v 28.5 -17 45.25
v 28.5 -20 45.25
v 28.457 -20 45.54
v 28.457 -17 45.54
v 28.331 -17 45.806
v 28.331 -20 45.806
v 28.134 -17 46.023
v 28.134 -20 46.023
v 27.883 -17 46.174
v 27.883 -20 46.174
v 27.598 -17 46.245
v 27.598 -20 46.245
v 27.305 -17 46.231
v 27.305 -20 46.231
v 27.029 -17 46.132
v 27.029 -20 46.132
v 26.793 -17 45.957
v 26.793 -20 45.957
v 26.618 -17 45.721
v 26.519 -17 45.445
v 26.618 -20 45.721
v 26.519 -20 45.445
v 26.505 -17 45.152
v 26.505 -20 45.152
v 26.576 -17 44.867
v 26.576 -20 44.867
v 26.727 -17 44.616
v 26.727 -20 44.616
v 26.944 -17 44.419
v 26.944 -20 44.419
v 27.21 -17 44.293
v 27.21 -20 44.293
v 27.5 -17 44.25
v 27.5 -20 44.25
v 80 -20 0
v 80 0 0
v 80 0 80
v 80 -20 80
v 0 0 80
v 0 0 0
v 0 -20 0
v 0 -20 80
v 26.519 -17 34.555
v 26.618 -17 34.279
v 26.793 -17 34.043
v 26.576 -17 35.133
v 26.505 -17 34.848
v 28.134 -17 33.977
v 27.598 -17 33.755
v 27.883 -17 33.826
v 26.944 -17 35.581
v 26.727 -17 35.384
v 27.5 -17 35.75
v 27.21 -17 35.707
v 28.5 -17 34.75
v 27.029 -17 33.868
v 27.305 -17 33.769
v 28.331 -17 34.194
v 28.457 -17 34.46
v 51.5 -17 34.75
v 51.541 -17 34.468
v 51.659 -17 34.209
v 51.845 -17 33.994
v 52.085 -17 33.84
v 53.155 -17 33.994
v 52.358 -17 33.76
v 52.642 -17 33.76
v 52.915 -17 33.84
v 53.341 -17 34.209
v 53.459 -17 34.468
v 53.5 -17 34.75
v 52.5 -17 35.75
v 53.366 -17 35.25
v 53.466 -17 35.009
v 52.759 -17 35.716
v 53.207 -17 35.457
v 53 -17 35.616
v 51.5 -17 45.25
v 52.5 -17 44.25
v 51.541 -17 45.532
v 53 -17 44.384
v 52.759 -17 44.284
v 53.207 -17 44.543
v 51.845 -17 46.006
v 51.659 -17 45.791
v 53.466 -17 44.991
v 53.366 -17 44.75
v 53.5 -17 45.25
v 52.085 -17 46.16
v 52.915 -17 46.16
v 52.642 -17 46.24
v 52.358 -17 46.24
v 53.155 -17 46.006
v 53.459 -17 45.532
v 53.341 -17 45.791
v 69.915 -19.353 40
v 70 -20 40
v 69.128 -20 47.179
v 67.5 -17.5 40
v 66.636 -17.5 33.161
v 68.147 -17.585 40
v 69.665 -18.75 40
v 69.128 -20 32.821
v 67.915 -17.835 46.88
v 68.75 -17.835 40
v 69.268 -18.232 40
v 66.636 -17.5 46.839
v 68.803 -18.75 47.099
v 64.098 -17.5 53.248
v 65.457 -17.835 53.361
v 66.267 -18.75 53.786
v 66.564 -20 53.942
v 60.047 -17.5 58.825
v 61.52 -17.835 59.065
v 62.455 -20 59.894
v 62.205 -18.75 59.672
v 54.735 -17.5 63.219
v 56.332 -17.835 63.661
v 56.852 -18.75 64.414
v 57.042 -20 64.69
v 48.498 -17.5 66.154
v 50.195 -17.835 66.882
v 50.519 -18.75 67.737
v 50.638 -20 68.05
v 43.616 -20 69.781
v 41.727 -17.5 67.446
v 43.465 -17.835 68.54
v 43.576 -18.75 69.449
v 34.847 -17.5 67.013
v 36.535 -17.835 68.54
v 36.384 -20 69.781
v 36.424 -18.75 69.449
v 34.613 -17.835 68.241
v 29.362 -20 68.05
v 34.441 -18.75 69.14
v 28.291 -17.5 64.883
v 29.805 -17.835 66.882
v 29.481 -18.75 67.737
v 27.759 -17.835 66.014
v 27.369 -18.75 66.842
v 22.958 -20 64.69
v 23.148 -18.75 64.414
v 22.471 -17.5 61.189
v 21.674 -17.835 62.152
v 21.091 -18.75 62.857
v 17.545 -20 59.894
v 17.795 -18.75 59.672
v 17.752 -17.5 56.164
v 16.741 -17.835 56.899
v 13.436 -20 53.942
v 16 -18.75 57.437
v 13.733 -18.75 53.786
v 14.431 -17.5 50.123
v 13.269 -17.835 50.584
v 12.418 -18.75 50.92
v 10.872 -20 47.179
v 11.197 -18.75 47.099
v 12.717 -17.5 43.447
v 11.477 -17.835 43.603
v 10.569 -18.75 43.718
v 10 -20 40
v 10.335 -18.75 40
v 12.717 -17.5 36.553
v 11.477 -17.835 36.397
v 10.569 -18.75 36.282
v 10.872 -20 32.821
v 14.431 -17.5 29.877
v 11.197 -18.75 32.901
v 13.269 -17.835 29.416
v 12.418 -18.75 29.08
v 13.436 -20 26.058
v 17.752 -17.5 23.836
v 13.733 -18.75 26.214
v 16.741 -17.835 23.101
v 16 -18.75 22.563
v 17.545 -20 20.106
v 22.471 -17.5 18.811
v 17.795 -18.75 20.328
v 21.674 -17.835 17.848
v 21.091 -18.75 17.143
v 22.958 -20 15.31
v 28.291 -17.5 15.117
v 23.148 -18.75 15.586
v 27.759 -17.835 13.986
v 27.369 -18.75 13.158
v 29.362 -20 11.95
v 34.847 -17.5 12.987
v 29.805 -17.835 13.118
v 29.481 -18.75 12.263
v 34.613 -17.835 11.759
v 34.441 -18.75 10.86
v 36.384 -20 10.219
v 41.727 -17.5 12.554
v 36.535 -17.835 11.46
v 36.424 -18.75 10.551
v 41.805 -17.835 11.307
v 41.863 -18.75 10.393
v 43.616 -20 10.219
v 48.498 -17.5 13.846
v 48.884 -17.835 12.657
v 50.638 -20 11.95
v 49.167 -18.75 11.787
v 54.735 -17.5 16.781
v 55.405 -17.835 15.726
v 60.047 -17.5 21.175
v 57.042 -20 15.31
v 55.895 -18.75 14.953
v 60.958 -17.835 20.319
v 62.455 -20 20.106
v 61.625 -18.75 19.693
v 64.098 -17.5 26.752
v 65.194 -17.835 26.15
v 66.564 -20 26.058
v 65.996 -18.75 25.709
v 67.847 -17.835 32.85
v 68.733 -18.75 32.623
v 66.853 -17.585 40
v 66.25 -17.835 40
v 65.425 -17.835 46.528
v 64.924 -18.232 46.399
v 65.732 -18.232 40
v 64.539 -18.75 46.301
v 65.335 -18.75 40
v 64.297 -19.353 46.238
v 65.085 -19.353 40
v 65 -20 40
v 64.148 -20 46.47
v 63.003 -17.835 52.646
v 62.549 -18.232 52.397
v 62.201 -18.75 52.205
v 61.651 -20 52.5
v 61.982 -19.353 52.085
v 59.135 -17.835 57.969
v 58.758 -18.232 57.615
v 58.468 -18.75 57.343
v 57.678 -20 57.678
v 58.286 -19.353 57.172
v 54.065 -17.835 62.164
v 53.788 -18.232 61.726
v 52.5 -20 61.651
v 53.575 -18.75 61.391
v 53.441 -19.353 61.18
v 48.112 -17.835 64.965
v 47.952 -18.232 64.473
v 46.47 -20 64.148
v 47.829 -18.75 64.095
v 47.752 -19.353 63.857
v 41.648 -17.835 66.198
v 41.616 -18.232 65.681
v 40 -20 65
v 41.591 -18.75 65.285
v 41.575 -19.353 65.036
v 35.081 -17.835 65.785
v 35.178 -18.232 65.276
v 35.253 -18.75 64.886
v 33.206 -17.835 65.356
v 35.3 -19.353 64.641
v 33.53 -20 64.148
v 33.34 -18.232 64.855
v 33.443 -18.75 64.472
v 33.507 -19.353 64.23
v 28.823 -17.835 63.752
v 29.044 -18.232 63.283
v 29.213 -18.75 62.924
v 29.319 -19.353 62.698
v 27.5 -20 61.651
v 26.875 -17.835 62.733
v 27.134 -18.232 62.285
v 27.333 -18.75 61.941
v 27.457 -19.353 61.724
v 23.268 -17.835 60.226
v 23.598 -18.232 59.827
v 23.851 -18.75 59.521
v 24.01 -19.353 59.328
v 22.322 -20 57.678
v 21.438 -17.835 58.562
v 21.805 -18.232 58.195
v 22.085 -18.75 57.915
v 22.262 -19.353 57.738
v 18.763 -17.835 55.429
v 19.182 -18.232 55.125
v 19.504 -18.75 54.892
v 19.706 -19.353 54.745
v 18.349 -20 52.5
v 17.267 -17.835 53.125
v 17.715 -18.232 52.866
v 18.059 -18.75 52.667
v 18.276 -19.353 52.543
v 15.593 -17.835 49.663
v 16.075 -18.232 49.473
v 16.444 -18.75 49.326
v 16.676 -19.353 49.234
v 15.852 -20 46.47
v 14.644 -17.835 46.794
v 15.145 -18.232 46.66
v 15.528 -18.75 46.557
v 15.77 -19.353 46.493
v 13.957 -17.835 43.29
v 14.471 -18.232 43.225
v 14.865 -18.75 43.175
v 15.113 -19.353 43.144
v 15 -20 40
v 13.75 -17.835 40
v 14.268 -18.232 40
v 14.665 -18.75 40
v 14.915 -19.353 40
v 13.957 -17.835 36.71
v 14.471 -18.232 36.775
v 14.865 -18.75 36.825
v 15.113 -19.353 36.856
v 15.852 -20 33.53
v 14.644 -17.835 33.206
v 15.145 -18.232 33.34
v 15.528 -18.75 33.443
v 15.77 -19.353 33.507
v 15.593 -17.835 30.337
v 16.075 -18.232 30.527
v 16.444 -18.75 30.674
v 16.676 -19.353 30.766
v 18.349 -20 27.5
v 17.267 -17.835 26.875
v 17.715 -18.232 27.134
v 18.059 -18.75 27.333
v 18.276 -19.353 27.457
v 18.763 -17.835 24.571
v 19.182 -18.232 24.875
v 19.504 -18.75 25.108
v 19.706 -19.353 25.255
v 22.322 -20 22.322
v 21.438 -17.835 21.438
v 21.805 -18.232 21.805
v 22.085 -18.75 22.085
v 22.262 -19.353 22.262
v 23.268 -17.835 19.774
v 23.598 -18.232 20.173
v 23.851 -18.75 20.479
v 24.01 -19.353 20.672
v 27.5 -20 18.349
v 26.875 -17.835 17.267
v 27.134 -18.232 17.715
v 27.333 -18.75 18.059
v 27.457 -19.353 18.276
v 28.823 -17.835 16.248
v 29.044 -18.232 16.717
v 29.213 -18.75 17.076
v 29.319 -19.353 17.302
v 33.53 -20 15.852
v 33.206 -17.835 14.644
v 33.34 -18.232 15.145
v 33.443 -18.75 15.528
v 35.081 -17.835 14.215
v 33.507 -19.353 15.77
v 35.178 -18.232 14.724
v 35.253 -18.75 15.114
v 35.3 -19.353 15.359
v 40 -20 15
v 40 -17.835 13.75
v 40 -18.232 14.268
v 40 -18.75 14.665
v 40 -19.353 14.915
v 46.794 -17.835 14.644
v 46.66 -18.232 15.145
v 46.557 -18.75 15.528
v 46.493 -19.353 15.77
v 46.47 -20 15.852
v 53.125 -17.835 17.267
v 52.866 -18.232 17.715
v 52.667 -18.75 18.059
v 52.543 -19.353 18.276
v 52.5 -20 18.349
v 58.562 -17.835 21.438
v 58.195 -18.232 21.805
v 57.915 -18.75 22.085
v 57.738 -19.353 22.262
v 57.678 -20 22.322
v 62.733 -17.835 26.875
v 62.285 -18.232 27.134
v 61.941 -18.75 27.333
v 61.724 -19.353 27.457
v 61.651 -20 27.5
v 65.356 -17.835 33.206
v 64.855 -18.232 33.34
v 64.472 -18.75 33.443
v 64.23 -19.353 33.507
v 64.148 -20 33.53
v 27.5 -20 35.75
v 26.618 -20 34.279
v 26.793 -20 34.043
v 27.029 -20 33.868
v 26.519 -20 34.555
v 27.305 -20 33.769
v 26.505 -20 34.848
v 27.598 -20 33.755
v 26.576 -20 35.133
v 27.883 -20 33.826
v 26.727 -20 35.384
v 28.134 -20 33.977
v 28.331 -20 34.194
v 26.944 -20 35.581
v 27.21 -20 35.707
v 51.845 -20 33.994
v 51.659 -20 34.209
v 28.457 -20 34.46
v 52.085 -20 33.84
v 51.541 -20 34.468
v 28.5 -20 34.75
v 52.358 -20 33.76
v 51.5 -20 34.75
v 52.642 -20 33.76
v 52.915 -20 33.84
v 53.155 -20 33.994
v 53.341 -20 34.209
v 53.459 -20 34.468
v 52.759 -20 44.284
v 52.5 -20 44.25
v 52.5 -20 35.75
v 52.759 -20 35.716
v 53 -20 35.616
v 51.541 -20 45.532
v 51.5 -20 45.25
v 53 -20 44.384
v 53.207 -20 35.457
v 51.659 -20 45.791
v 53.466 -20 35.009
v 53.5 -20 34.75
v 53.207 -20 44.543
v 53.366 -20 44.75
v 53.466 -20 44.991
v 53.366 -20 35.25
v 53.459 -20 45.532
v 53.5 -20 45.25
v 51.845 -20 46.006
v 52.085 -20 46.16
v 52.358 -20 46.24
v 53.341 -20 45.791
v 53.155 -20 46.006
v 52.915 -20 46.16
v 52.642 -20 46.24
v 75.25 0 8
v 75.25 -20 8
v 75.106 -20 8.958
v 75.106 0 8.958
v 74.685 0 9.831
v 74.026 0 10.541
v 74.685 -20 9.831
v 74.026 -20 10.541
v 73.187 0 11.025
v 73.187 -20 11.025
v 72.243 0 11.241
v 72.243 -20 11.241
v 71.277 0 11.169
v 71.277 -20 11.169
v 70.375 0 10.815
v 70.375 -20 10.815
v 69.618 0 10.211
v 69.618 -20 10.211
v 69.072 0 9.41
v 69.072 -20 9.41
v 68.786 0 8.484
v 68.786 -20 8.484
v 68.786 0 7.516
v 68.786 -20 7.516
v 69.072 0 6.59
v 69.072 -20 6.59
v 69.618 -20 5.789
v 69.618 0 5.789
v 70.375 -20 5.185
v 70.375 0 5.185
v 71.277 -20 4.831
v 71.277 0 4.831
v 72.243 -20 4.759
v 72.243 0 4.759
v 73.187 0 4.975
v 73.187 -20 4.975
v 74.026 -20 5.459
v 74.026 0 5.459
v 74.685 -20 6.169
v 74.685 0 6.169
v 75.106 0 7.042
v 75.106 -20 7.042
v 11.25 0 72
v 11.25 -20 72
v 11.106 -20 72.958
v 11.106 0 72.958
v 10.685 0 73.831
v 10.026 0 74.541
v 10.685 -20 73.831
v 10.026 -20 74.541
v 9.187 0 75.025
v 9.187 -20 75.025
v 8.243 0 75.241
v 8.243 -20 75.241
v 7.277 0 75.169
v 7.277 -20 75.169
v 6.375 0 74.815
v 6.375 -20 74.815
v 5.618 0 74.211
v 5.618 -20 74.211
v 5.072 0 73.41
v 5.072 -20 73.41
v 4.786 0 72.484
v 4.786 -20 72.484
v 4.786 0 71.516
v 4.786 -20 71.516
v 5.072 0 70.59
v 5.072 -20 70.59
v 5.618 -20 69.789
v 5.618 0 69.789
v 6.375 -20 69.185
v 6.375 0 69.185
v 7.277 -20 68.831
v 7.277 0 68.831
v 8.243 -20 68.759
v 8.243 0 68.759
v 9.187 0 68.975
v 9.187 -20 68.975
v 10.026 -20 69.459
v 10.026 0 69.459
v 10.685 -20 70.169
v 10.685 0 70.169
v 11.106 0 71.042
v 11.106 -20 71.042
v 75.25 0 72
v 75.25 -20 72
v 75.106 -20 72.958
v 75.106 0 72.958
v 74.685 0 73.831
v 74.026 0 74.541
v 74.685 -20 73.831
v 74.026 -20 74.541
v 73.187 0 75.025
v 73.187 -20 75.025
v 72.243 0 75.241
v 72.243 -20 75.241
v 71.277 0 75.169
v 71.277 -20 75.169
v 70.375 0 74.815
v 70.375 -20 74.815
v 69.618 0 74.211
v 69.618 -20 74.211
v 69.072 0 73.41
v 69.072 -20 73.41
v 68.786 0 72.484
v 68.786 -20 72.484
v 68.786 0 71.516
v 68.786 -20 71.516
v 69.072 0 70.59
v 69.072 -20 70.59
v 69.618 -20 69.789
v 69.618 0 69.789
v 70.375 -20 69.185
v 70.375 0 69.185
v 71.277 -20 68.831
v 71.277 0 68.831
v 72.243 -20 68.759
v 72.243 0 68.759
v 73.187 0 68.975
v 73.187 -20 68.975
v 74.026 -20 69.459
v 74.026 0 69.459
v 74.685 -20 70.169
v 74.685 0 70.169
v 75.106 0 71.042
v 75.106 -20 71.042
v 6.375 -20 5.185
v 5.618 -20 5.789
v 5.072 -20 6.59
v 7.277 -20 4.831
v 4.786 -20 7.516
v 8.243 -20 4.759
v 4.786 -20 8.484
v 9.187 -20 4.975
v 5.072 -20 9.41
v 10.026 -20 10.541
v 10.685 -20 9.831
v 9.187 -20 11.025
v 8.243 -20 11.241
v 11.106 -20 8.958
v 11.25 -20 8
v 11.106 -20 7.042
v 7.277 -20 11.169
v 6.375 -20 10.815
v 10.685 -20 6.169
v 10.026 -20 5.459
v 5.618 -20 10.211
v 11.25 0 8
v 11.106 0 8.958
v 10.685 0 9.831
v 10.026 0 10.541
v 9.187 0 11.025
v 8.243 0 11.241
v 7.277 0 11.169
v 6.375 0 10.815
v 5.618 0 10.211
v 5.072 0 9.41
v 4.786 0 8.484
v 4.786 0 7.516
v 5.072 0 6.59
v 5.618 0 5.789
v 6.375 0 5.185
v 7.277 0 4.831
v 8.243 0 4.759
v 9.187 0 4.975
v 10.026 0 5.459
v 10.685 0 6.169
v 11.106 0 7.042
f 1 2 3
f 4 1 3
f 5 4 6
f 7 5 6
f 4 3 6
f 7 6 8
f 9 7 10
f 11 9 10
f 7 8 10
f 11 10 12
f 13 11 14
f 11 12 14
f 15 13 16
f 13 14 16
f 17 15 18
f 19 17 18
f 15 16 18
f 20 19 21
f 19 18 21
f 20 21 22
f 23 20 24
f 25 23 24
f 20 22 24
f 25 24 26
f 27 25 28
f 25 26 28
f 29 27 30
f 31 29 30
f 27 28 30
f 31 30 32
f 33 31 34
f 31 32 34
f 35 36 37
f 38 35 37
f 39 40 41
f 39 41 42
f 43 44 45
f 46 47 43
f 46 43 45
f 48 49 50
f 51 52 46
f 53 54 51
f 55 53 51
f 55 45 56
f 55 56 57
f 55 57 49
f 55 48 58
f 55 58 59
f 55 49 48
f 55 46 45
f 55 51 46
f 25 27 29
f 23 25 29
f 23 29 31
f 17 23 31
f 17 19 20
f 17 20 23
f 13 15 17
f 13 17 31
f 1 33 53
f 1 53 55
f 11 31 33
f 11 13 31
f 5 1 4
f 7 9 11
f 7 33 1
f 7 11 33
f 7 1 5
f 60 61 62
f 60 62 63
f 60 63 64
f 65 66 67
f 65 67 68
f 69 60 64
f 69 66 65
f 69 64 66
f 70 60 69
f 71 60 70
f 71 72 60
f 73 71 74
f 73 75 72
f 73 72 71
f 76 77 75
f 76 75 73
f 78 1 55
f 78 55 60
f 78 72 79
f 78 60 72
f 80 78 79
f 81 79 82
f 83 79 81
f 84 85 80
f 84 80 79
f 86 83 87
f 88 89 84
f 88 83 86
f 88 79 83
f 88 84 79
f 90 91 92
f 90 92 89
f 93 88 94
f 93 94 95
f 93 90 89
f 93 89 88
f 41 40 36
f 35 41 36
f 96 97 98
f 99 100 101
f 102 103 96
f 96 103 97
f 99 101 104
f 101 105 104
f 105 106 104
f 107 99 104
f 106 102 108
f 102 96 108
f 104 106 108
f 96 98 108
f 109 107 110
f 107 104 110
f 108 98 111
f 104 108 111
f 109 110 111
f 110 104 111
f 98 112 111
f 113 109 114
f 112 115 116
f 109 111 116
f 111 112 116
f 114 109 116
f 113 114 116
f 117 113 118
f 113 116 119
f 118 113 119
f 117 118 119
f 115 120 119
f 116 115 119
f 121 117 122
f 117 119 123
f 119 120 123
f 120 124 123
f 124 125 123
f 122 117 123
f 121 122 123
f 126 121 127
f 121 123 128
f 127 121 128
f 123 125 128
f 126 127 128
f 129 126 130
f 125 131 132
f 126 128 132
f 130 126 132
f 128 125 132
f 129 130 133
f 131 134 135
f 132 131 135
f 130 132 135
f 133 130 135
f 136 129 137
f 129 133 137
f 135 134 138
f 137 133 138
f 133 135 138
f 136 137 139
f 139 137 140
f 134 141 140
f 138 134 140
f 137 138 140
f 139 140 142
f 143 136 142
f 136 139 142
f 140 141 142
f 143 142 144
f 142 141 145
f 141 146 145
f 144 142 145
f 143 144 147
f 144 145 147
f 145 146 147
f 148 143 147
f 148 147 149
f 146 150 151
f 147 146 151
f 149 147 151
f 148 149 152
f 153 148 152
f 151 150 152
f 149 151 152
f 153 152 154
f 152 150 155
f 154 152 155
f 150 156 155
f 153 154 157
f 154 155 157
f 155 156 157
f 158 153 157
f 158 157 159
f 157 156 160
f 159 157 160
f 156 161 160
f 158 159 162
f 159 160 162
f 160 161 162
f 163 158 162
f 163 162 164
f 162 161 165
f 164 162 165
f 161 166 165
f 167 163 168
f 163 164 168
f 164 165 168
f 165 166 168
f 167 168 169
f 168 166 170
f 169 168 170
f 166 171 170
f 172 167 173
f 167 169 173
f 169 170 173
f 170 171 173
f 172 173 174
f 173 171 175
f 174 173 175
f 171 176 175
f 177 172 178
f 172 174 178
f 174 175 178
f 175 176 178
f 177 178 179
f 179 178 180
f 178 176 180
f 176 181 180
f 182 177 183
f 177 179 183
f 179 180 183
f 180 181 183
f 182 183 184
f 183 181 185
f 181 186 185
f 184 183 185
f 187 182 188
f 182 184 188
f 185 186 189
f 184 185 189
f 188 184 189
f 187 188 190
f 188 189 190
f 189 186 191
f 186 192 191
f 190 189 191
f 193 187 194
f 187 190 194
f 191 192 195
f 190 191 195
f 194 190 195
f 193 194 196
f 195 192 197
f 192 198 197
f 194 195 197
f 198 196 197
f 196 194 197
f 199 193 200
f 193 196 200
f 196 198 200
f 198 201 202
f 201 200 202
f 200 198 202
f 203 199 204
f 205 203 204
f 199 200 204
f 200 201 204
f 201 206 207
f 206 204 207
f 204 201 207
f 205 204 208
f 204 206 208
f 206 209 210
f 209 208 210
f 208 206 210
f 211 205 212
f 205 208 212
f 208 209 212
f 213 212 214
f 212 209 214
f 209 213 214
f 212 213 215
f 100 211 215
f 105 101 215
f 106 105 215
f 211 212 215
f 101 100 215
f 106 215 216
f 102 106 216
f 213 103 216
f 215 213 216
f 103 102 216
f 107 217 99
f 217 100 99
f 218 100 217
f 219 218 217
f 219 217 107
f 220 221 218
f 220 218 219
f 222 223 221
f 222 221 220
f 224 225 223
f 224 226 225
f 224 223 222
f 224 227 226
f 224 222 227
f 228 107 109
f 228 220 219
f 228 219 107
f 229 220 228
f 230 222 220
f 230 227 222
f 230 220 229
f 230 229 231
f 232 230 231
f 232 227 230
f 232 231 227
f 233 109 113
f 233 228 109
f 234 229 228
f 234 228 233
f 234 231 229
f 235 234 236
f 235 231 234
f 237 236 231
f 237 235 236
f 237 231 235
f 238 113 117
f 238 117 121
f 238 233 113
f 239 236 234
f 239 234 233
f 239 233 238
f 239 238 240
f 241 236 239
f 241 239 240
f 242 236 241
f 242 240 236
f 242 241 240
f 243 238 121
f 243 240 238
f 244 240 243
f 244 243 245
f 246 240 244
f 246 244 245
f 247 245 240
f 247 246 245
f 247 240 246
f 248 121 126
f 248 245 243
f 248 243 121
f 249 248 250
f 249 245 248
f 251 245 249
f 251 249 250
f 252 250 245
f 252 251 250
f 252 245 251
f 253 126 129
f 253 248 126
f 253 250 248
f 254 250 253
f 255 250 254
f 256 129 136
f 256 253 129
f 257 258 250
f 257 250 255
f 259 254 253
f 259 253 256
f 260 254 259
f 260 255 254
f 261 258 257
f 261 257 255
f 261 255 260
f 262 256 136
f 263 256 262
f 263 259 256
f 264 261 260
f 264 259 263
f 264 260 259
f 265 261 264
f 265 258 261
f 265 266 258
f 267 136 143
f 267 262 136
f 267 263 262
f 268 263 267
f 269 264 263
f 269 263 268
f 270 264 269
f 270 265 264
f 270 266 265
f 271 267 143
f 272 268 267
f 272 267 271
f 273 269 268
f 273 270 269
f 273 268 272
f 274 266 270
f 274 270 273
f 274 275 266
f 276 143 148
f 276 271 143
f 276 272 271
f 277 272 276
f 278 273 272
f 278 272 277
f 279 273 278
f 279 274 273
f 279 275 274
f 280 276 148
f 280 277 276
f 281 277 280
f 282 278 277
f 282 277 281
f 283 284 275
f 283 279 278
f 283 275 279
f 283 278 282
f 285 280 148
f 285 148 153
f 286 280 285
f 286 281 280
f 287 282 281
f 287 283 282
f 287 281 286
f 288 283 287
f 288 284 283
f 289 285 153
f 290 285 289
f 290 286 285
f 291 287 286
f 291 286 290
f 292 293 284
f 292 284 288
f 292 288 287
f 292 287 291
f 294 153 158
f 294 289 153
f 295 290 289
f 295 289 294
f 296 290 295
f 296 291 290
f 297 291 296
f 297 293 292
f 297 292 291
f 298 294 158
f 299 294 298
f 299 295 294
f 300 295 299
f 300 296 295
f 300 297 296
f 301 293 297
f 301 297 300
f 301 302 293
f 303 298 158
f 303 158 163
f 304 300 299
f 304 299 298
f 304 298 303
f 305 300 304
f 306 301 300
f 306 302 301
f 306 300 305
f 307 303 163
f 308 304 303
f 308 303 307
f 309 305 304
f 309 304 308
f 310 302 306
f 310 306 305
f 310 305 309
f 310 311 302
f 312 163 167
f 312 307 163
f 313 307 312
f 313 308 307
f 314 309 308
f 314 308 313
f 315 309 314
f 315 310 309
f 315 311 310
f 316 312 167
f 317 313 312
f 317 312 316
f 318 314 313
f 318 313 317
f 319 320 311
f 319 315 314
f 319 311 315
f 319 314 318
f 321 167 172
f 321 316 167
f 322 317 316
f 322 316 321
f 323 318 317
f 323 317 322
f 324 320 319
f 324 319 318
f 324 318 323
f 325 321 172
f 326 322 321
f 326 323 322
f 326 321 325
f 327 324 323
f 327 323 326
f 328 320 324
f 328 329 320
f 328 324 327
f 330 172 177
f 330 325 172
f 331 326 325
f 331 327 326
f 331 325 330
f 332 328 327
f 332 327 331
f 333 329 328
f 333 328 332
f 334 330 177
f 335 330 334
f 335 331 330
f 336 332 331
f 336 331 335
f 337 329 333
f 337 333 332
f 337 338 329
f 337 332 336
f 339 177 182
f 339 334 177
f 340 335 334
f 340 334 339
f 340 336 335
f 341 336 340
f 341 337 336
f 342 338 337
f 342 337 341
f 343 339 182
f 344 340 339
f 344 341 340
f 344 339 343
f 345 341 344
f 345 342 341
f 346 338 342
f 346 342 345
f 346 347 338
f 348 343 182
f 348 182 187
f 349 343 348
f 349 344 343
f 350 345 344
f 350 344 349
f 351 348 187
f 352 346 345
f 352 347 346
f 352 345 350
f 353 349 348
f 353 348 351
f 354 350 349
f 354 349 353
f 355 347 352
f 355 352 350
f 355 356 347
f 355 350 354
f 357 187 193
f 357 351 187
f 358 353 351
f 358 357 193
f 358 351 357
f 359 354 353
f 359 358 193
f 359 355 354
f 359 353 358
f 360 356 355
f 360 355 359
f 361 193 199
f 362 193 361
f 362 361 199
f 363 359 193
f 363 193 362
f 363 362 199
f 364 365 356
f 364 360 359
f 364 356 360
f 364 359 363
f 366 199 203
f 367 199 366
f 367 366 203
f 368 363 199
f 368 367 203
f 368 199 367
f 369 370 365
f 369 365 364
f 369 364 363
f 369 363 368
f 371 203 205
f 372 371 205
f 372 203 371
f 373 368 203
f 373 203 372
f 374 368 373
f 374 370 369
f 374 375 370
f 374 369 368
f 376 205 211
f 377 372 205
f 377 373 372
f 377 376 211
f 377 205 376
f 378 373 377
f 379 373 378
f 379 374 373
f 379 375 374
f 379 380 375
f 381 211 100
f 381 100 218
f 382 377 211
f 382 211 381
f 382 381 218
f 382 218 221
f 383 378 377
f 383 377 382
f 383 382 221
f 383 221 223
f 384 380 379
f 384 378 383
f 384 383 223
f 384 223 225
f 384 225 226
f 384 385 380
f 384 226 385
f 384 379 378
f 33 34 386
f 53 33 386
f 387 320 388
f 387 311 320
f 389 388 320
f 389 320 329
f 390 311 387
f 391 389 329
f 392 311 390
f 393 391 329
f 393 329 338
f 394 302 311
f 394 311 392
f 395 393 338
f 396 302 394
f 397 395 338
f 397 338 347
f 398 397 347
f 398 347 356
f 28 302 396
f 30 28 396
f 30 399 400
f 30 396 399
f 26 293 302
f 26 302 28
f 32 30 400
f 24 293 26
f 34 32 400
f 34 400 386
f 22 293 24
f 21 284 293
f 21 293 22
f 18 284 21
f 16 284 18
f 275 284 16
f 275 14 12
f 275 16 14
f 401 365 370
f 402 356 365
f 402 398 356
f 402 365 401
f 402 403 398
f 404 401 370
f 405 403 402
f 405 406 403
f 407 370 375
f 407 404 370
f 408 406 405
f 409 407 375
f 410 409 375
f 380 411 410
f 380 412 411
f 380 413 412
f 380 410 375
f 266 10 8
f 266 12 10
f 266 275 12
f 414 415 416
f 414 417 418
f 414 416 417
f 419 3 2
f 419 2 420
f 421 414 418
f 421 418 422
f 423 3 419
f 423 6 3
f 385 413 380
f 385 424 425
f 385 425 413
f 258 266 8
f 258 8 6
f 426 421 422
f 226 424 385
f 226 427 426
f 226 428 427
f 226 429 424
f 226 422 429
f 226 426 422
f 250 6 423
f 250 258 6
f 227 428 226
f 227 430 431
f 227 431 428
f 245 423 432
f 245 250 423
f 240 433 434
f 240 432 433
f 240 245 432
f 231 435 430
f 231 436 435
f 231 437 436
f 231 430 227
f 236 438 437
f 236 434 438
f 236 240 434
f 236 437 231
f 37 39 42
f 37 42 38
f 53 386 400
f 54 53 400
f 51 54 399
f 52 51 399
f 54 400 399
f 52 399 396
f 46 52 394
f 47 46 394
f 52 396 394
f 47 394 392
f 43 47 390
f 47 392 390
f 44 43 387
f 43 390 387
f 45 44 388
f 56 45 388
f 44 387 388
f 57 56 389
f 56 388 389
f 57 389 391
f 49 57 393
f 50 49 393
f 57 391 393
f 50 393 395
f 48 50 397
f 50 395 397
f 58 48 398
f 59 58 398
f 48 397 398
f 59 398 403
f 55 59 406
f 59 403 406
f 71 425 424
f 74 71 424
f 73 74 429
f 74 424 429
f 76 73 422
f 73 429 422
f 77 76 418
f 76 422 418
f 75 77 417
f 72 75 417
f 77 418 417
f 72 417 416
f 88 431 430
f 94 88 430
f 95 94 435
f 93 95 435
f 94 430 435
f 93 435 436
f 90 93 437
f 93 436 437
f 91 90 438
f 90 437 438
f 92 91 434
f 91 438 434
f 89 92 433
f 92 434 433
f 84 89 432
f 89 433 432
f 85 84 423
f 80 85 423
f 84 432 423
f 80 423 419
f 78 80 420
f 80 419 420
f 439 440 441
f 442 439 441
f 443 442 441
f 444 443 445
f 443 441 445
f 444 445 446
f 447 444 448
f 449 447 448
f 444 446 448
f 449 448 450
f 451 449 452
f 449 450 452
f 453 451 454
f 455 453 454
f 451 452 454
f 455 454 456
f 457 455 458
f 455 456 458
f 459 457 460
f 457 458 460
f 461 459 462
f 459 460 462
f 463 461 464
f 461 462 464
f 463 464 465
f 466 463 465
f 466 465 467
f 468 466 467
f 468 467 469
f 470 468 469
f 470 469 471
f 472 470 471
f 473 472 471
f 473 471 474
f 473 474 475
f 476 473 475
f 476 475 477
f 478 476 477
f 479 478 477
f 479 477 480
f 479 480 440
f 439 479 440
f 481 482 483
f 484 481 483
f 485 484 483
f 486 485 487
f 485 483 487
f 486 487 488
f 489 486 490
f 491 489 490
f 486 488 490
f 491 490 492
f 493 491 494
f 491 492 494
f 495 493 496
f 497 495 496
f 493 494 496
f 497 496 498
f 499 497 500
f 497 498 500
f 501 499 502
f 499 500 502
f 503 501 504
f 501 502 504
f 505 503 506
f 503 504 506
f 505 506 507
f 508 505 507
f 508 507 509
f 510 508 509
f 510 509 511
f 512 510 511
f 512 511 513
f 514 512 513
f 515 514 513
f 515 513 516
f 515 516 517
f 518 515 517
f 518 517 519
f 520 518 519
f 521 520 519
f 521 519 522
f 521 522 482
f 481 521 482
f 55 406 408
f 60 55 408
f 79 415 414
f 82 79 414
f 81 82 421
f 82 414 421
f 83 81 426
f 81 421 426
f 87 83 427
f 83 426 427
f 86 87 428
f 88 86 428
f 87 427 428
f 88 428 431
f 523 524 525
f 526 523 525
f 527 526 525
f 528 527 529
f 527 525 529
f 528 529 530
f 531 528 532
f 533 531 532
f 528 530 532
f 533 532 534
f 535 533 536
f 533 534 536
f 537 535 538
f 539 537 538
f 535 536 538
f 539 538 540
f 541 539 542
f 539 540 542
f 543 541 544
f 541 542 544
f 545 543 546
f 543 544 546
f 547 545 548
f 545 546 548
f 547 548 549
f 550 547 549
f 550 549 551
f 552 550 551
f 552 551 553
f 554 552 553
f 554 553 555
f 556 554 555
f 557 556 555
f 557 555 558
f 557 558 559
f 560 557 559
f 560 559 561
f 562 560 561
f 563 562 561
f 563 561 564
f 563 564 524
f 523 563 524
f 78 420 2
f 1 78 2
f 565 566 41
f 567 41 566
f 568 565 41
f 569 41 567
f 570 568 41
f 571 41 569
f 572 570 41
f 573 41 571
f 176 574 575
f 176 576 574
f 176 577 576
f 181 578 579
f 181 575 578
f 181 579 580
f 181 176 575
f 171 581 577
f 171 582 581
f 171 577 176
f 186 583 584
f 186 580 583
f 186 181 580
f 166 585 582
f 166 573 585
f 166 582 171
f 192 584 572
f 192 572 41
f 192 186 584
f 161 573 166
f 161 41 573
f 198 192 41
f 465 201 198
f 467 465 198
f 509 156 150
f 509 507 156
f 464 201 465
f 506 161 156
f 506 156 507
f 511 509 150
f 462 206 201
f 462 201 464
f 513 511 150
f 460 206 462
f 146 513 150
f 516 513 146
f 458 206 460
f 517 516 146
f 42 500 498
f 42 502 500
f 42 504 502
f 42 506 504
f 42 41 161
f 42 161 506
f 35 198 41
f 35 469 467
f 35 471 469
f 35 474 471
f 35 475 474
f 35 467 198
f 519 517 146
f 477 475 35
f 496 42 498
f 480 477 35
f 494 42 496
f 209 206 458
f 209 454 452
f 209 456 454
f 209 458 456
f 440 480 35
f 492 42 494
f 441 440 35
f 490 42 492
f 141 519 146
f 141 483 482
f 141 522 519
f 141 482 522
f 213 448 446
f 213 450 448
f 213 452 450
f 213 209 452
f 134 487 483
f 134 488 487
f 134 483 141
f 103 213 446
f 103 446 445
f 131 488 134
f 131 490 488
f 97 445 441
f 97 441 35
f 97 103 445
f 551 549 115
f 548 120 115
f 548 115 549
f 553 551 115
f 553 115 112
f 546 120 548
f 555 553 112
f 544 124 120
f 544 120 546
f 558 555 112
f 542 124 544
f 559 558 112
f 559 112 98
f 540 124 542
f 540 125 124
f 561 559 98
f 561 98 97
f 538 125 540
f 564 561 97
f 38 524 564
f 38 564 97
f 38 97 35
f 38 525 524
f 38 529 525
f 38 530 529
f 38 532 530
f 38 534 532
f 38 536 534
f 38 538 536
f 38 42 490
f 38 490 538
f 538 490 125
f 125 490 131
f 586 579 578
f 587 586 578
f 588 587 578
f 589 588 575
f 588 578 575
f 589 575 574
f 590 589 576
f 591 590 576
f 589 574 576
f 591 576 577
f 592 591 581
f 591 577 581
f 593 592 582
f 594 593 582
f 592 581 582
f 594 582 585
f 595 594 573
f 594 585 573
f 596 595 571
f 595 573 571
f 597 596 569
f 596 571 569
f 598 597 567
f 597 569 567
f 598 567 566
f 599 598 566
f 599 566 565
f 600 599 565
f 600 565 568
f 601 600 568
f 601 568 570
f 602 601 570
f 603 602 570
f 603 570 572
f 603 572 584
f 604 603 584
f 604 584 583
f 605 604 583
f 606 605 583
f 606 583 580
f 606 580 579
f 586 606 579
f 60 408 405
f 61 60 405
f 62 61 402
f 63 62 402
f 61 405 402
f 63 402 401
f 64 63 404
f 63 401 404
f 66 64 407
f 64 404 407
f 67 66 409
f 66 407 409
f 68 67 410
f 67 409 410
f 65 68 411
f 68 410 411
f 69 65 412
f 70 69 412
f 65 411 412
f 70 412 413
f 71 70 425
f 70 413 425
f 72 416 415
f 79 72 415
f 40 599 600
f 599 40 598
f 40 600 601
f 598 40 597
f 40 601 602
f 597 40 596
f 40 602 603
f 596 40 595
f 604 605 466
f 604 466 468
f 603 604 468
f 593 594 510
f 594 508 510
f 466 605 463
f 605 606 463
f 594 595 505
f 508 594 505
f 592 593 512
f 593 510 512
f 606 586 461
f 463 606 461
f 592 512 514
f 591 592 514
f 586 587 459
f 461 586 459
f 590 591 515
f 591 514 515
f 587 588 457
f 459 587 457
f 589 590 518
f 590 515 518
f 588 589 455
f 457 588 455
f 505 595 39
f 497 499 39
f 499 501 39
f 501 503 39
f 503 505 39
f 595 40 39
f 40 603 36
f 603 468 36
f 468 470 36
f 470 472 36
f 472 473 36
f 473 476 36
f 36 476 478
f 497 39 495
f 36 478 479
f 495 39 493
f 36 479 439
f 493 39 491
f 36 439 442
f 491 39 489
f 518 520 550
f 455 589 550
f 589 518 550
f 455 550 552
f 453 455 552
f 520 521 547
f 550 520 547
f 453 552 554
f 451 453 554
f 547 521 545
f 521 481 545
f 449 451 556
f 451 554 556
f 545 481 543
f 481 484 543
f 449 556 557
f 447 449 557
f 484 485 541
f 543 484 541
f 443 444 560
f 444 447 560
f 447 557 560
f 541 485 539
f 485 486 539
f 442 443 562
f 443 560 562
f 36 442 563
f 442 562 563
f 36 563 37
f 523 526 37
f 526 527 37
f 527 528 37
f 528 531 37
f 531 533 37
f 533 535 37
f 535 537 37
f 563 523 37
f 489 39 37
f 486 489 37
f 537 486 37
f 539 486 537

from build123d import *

# Parameters (mm, degrees)
F1_W     = 80
F1_H     = 80
F2_DEPTH = 20
F4_R     = 3.25
F5_DEPTH = 20.001
F4_R_2   = 30
F4_R_3   = 25
F6_DEPTH = 2.5
F7_DEPTH = 3
F8_R     = 2.49999
F9_R     = 2.49999


# Not quite as in the source:
# - a fillet or chamfer is up to 0.001 mm smaller than in the source, because OpenCascade refuses the exact size


with BuildPart() as f2:
    # F1 (on Front) → F2 (new body)
    with BuildSketch(Plane.XZ):
        with Locations((40, 40)):
            Rectangle(F1_W, F1_H)
    extrude(amount=F2_DEPTH)

    # F4 (on face) → F5 (cut, through all)
    with BuildSketch(Plane.XZ.offset(20)):
        with Locations((72, 8)):
            Circle(F4_R)
        with Locations((8, 8)):
            Circle(F4_R)
        with Locations((8, 72)):
            Circle(F4_R)
        with Locations((72, 72)):
            Circle(F4_R)
    extrude(amount=-F5_DEPTH, mode=Mode.SUBTRACT)

    # F4 (on face) → F6 (cut)
    with BuildSketch(Plane.XZ.offset(20)):
        with Locations((40, 40)):
            Circle(F4_R_2)
        with Locations((40, 40)):
            Circle(F4_R_3, mode=Mode.SUBTRACT)
    extrude(amount=-F6_DEPTH, mode=Mode.SUBTRACT)

    # F4 (on face) → F7 (cut)
    with BuildSketch(Plane.XZ.offset(20)):
        with BuildLine():
            Line((28.5, 45.25), (27.5, 45.25))
            Line((27.5, 45.25), (27.5, 44.25))
            ThreePointArc((27.5, 44.25), (28.2071067812, 44.5428932188), (28.5, 45.25))
        make_face()
        with BuildLine():
            Line((51.5, 45.25), (28.5, 45.25))
            ThreePointArc((28.5, 45.25), (28.2071067812, 44.5428932188), (27.5, 44.25))
            Line((27.5, 44.25), (27.5, 40))
            Line((27.5, 40), (52.5, 40))
            Line((52.5, 40), (52.5, 44.25))
            ThreePointArc((52.5, 44.25), (51.7928932188, 44.5428932188), (51.5, 45.25))
        make_face()
        with BuildLine():
            Line((52.5, 45.25), (51.5, 45.25))
            ThreePointArc((51.5, 45.25), (51.7928932188, 44.5428932188), (52.5, 44.25))
            Line((52.5, 44.25), (52.5, 45.25))
        make_face()
        with BuildLine():
            ThreePointArc((28.5, 34.75), (28.2071067812, 35.4571067812), (27.5, 35.75))
            Line((27.5, 35.75), (27.5, 34.75))
            Line((27.5, 34.75), (28.5, 34.75))
        make_face()
        with BuildLine():
            Line((52.5, 40), (27.5, 40))
            Line((27.5, 40), (27.5, 35.75))
            ThreePointArc((27.5, 35.75), (28.2071067812, 35.4571067812), (28.5, 34.75))
            Line((28.5, 34.75), (51.5, 34.75))
            ThreePointArc((51.5, 34.75), (51.7928932188, 35.4571067812), (52.5, 35.75))
            Line((52.5, 35.75), (52.5, 40))
        make_face()
        with BuildLine():
            Line((52.5, 34.75), (52.5, 35.75))
            ThreePointArc((52.5, 35.75), (51.7928932188, 35.4571067812), (51.5, 34.75))
            Line((51.5, 34.75), (52.5, 34.75))
        make_face()
        with BuildLine():
            Line((27.5, 34.75), (27.5, 35.75))
            ThreePointArc((27.5, 35.75), (26.7928932188, 34.0428932188), (28.5, 34.75))
            Line((28.5, 34.75), (27.5, 34.75))
        make_face()
        with BuildLine():
            ThreePointArc((53.5, 34.75), (53.2071067812, 35.4571067812), (52.5, 35.75))
            Line((52.5, 35.75), (52.5, 34.75))
            Line((52.5, 34.75), (51.5, 34.75))
            ThreePointArc((51.5, 34.75), (52.5, 33.75), (53.5, 34.75))
        make_face()
        with BuildLine():
            ThreePointArc((53.5, 45.25), (52.5, 46.25), (51.5, 45.25))
            Line((51.5, 45.25), (52.5, 45.25))
            Line((52.5, 45.25), (52.5, 44.25))
            ThreePointArc((52.5, 44.25), (53.2071067812, 44.5428932188), (53.5, 45.25))
        make_face()
        with BuildLine():
            Line((27.5, 44.25), (27.5, 45.25))
            Line((27.5, 45.25), (28.5, 45.25))
            ThreePointArc((28.5, 45.25), (26.7928932188, 45.9571067812), (27.5, 44.25))
        make_face()
    extrude(amount=-F7_DEPTH, mode=Mode.SUBTRACT)

    # F8 (radius 2.5 in the source; OpenCascade refuses exactly that, so slightly less here)
    f8_edges = [f2.edges().sort_by_distance(p)[0] for p in [
        (15, -17.5, 40),
    ]]
    fillet(f8_edges, radius=F8_R)

    # F9 (radius 2.5 in the source; OpenCascade refuses exactly that, so slightly less here)
    f9_edges = [f2.edges().sort_by_distance(p)[0] for p in [
        (10, -17.5, 40),
    ]]
    fillet(f9_edges, radius=F9_R)


solid = f2.part
